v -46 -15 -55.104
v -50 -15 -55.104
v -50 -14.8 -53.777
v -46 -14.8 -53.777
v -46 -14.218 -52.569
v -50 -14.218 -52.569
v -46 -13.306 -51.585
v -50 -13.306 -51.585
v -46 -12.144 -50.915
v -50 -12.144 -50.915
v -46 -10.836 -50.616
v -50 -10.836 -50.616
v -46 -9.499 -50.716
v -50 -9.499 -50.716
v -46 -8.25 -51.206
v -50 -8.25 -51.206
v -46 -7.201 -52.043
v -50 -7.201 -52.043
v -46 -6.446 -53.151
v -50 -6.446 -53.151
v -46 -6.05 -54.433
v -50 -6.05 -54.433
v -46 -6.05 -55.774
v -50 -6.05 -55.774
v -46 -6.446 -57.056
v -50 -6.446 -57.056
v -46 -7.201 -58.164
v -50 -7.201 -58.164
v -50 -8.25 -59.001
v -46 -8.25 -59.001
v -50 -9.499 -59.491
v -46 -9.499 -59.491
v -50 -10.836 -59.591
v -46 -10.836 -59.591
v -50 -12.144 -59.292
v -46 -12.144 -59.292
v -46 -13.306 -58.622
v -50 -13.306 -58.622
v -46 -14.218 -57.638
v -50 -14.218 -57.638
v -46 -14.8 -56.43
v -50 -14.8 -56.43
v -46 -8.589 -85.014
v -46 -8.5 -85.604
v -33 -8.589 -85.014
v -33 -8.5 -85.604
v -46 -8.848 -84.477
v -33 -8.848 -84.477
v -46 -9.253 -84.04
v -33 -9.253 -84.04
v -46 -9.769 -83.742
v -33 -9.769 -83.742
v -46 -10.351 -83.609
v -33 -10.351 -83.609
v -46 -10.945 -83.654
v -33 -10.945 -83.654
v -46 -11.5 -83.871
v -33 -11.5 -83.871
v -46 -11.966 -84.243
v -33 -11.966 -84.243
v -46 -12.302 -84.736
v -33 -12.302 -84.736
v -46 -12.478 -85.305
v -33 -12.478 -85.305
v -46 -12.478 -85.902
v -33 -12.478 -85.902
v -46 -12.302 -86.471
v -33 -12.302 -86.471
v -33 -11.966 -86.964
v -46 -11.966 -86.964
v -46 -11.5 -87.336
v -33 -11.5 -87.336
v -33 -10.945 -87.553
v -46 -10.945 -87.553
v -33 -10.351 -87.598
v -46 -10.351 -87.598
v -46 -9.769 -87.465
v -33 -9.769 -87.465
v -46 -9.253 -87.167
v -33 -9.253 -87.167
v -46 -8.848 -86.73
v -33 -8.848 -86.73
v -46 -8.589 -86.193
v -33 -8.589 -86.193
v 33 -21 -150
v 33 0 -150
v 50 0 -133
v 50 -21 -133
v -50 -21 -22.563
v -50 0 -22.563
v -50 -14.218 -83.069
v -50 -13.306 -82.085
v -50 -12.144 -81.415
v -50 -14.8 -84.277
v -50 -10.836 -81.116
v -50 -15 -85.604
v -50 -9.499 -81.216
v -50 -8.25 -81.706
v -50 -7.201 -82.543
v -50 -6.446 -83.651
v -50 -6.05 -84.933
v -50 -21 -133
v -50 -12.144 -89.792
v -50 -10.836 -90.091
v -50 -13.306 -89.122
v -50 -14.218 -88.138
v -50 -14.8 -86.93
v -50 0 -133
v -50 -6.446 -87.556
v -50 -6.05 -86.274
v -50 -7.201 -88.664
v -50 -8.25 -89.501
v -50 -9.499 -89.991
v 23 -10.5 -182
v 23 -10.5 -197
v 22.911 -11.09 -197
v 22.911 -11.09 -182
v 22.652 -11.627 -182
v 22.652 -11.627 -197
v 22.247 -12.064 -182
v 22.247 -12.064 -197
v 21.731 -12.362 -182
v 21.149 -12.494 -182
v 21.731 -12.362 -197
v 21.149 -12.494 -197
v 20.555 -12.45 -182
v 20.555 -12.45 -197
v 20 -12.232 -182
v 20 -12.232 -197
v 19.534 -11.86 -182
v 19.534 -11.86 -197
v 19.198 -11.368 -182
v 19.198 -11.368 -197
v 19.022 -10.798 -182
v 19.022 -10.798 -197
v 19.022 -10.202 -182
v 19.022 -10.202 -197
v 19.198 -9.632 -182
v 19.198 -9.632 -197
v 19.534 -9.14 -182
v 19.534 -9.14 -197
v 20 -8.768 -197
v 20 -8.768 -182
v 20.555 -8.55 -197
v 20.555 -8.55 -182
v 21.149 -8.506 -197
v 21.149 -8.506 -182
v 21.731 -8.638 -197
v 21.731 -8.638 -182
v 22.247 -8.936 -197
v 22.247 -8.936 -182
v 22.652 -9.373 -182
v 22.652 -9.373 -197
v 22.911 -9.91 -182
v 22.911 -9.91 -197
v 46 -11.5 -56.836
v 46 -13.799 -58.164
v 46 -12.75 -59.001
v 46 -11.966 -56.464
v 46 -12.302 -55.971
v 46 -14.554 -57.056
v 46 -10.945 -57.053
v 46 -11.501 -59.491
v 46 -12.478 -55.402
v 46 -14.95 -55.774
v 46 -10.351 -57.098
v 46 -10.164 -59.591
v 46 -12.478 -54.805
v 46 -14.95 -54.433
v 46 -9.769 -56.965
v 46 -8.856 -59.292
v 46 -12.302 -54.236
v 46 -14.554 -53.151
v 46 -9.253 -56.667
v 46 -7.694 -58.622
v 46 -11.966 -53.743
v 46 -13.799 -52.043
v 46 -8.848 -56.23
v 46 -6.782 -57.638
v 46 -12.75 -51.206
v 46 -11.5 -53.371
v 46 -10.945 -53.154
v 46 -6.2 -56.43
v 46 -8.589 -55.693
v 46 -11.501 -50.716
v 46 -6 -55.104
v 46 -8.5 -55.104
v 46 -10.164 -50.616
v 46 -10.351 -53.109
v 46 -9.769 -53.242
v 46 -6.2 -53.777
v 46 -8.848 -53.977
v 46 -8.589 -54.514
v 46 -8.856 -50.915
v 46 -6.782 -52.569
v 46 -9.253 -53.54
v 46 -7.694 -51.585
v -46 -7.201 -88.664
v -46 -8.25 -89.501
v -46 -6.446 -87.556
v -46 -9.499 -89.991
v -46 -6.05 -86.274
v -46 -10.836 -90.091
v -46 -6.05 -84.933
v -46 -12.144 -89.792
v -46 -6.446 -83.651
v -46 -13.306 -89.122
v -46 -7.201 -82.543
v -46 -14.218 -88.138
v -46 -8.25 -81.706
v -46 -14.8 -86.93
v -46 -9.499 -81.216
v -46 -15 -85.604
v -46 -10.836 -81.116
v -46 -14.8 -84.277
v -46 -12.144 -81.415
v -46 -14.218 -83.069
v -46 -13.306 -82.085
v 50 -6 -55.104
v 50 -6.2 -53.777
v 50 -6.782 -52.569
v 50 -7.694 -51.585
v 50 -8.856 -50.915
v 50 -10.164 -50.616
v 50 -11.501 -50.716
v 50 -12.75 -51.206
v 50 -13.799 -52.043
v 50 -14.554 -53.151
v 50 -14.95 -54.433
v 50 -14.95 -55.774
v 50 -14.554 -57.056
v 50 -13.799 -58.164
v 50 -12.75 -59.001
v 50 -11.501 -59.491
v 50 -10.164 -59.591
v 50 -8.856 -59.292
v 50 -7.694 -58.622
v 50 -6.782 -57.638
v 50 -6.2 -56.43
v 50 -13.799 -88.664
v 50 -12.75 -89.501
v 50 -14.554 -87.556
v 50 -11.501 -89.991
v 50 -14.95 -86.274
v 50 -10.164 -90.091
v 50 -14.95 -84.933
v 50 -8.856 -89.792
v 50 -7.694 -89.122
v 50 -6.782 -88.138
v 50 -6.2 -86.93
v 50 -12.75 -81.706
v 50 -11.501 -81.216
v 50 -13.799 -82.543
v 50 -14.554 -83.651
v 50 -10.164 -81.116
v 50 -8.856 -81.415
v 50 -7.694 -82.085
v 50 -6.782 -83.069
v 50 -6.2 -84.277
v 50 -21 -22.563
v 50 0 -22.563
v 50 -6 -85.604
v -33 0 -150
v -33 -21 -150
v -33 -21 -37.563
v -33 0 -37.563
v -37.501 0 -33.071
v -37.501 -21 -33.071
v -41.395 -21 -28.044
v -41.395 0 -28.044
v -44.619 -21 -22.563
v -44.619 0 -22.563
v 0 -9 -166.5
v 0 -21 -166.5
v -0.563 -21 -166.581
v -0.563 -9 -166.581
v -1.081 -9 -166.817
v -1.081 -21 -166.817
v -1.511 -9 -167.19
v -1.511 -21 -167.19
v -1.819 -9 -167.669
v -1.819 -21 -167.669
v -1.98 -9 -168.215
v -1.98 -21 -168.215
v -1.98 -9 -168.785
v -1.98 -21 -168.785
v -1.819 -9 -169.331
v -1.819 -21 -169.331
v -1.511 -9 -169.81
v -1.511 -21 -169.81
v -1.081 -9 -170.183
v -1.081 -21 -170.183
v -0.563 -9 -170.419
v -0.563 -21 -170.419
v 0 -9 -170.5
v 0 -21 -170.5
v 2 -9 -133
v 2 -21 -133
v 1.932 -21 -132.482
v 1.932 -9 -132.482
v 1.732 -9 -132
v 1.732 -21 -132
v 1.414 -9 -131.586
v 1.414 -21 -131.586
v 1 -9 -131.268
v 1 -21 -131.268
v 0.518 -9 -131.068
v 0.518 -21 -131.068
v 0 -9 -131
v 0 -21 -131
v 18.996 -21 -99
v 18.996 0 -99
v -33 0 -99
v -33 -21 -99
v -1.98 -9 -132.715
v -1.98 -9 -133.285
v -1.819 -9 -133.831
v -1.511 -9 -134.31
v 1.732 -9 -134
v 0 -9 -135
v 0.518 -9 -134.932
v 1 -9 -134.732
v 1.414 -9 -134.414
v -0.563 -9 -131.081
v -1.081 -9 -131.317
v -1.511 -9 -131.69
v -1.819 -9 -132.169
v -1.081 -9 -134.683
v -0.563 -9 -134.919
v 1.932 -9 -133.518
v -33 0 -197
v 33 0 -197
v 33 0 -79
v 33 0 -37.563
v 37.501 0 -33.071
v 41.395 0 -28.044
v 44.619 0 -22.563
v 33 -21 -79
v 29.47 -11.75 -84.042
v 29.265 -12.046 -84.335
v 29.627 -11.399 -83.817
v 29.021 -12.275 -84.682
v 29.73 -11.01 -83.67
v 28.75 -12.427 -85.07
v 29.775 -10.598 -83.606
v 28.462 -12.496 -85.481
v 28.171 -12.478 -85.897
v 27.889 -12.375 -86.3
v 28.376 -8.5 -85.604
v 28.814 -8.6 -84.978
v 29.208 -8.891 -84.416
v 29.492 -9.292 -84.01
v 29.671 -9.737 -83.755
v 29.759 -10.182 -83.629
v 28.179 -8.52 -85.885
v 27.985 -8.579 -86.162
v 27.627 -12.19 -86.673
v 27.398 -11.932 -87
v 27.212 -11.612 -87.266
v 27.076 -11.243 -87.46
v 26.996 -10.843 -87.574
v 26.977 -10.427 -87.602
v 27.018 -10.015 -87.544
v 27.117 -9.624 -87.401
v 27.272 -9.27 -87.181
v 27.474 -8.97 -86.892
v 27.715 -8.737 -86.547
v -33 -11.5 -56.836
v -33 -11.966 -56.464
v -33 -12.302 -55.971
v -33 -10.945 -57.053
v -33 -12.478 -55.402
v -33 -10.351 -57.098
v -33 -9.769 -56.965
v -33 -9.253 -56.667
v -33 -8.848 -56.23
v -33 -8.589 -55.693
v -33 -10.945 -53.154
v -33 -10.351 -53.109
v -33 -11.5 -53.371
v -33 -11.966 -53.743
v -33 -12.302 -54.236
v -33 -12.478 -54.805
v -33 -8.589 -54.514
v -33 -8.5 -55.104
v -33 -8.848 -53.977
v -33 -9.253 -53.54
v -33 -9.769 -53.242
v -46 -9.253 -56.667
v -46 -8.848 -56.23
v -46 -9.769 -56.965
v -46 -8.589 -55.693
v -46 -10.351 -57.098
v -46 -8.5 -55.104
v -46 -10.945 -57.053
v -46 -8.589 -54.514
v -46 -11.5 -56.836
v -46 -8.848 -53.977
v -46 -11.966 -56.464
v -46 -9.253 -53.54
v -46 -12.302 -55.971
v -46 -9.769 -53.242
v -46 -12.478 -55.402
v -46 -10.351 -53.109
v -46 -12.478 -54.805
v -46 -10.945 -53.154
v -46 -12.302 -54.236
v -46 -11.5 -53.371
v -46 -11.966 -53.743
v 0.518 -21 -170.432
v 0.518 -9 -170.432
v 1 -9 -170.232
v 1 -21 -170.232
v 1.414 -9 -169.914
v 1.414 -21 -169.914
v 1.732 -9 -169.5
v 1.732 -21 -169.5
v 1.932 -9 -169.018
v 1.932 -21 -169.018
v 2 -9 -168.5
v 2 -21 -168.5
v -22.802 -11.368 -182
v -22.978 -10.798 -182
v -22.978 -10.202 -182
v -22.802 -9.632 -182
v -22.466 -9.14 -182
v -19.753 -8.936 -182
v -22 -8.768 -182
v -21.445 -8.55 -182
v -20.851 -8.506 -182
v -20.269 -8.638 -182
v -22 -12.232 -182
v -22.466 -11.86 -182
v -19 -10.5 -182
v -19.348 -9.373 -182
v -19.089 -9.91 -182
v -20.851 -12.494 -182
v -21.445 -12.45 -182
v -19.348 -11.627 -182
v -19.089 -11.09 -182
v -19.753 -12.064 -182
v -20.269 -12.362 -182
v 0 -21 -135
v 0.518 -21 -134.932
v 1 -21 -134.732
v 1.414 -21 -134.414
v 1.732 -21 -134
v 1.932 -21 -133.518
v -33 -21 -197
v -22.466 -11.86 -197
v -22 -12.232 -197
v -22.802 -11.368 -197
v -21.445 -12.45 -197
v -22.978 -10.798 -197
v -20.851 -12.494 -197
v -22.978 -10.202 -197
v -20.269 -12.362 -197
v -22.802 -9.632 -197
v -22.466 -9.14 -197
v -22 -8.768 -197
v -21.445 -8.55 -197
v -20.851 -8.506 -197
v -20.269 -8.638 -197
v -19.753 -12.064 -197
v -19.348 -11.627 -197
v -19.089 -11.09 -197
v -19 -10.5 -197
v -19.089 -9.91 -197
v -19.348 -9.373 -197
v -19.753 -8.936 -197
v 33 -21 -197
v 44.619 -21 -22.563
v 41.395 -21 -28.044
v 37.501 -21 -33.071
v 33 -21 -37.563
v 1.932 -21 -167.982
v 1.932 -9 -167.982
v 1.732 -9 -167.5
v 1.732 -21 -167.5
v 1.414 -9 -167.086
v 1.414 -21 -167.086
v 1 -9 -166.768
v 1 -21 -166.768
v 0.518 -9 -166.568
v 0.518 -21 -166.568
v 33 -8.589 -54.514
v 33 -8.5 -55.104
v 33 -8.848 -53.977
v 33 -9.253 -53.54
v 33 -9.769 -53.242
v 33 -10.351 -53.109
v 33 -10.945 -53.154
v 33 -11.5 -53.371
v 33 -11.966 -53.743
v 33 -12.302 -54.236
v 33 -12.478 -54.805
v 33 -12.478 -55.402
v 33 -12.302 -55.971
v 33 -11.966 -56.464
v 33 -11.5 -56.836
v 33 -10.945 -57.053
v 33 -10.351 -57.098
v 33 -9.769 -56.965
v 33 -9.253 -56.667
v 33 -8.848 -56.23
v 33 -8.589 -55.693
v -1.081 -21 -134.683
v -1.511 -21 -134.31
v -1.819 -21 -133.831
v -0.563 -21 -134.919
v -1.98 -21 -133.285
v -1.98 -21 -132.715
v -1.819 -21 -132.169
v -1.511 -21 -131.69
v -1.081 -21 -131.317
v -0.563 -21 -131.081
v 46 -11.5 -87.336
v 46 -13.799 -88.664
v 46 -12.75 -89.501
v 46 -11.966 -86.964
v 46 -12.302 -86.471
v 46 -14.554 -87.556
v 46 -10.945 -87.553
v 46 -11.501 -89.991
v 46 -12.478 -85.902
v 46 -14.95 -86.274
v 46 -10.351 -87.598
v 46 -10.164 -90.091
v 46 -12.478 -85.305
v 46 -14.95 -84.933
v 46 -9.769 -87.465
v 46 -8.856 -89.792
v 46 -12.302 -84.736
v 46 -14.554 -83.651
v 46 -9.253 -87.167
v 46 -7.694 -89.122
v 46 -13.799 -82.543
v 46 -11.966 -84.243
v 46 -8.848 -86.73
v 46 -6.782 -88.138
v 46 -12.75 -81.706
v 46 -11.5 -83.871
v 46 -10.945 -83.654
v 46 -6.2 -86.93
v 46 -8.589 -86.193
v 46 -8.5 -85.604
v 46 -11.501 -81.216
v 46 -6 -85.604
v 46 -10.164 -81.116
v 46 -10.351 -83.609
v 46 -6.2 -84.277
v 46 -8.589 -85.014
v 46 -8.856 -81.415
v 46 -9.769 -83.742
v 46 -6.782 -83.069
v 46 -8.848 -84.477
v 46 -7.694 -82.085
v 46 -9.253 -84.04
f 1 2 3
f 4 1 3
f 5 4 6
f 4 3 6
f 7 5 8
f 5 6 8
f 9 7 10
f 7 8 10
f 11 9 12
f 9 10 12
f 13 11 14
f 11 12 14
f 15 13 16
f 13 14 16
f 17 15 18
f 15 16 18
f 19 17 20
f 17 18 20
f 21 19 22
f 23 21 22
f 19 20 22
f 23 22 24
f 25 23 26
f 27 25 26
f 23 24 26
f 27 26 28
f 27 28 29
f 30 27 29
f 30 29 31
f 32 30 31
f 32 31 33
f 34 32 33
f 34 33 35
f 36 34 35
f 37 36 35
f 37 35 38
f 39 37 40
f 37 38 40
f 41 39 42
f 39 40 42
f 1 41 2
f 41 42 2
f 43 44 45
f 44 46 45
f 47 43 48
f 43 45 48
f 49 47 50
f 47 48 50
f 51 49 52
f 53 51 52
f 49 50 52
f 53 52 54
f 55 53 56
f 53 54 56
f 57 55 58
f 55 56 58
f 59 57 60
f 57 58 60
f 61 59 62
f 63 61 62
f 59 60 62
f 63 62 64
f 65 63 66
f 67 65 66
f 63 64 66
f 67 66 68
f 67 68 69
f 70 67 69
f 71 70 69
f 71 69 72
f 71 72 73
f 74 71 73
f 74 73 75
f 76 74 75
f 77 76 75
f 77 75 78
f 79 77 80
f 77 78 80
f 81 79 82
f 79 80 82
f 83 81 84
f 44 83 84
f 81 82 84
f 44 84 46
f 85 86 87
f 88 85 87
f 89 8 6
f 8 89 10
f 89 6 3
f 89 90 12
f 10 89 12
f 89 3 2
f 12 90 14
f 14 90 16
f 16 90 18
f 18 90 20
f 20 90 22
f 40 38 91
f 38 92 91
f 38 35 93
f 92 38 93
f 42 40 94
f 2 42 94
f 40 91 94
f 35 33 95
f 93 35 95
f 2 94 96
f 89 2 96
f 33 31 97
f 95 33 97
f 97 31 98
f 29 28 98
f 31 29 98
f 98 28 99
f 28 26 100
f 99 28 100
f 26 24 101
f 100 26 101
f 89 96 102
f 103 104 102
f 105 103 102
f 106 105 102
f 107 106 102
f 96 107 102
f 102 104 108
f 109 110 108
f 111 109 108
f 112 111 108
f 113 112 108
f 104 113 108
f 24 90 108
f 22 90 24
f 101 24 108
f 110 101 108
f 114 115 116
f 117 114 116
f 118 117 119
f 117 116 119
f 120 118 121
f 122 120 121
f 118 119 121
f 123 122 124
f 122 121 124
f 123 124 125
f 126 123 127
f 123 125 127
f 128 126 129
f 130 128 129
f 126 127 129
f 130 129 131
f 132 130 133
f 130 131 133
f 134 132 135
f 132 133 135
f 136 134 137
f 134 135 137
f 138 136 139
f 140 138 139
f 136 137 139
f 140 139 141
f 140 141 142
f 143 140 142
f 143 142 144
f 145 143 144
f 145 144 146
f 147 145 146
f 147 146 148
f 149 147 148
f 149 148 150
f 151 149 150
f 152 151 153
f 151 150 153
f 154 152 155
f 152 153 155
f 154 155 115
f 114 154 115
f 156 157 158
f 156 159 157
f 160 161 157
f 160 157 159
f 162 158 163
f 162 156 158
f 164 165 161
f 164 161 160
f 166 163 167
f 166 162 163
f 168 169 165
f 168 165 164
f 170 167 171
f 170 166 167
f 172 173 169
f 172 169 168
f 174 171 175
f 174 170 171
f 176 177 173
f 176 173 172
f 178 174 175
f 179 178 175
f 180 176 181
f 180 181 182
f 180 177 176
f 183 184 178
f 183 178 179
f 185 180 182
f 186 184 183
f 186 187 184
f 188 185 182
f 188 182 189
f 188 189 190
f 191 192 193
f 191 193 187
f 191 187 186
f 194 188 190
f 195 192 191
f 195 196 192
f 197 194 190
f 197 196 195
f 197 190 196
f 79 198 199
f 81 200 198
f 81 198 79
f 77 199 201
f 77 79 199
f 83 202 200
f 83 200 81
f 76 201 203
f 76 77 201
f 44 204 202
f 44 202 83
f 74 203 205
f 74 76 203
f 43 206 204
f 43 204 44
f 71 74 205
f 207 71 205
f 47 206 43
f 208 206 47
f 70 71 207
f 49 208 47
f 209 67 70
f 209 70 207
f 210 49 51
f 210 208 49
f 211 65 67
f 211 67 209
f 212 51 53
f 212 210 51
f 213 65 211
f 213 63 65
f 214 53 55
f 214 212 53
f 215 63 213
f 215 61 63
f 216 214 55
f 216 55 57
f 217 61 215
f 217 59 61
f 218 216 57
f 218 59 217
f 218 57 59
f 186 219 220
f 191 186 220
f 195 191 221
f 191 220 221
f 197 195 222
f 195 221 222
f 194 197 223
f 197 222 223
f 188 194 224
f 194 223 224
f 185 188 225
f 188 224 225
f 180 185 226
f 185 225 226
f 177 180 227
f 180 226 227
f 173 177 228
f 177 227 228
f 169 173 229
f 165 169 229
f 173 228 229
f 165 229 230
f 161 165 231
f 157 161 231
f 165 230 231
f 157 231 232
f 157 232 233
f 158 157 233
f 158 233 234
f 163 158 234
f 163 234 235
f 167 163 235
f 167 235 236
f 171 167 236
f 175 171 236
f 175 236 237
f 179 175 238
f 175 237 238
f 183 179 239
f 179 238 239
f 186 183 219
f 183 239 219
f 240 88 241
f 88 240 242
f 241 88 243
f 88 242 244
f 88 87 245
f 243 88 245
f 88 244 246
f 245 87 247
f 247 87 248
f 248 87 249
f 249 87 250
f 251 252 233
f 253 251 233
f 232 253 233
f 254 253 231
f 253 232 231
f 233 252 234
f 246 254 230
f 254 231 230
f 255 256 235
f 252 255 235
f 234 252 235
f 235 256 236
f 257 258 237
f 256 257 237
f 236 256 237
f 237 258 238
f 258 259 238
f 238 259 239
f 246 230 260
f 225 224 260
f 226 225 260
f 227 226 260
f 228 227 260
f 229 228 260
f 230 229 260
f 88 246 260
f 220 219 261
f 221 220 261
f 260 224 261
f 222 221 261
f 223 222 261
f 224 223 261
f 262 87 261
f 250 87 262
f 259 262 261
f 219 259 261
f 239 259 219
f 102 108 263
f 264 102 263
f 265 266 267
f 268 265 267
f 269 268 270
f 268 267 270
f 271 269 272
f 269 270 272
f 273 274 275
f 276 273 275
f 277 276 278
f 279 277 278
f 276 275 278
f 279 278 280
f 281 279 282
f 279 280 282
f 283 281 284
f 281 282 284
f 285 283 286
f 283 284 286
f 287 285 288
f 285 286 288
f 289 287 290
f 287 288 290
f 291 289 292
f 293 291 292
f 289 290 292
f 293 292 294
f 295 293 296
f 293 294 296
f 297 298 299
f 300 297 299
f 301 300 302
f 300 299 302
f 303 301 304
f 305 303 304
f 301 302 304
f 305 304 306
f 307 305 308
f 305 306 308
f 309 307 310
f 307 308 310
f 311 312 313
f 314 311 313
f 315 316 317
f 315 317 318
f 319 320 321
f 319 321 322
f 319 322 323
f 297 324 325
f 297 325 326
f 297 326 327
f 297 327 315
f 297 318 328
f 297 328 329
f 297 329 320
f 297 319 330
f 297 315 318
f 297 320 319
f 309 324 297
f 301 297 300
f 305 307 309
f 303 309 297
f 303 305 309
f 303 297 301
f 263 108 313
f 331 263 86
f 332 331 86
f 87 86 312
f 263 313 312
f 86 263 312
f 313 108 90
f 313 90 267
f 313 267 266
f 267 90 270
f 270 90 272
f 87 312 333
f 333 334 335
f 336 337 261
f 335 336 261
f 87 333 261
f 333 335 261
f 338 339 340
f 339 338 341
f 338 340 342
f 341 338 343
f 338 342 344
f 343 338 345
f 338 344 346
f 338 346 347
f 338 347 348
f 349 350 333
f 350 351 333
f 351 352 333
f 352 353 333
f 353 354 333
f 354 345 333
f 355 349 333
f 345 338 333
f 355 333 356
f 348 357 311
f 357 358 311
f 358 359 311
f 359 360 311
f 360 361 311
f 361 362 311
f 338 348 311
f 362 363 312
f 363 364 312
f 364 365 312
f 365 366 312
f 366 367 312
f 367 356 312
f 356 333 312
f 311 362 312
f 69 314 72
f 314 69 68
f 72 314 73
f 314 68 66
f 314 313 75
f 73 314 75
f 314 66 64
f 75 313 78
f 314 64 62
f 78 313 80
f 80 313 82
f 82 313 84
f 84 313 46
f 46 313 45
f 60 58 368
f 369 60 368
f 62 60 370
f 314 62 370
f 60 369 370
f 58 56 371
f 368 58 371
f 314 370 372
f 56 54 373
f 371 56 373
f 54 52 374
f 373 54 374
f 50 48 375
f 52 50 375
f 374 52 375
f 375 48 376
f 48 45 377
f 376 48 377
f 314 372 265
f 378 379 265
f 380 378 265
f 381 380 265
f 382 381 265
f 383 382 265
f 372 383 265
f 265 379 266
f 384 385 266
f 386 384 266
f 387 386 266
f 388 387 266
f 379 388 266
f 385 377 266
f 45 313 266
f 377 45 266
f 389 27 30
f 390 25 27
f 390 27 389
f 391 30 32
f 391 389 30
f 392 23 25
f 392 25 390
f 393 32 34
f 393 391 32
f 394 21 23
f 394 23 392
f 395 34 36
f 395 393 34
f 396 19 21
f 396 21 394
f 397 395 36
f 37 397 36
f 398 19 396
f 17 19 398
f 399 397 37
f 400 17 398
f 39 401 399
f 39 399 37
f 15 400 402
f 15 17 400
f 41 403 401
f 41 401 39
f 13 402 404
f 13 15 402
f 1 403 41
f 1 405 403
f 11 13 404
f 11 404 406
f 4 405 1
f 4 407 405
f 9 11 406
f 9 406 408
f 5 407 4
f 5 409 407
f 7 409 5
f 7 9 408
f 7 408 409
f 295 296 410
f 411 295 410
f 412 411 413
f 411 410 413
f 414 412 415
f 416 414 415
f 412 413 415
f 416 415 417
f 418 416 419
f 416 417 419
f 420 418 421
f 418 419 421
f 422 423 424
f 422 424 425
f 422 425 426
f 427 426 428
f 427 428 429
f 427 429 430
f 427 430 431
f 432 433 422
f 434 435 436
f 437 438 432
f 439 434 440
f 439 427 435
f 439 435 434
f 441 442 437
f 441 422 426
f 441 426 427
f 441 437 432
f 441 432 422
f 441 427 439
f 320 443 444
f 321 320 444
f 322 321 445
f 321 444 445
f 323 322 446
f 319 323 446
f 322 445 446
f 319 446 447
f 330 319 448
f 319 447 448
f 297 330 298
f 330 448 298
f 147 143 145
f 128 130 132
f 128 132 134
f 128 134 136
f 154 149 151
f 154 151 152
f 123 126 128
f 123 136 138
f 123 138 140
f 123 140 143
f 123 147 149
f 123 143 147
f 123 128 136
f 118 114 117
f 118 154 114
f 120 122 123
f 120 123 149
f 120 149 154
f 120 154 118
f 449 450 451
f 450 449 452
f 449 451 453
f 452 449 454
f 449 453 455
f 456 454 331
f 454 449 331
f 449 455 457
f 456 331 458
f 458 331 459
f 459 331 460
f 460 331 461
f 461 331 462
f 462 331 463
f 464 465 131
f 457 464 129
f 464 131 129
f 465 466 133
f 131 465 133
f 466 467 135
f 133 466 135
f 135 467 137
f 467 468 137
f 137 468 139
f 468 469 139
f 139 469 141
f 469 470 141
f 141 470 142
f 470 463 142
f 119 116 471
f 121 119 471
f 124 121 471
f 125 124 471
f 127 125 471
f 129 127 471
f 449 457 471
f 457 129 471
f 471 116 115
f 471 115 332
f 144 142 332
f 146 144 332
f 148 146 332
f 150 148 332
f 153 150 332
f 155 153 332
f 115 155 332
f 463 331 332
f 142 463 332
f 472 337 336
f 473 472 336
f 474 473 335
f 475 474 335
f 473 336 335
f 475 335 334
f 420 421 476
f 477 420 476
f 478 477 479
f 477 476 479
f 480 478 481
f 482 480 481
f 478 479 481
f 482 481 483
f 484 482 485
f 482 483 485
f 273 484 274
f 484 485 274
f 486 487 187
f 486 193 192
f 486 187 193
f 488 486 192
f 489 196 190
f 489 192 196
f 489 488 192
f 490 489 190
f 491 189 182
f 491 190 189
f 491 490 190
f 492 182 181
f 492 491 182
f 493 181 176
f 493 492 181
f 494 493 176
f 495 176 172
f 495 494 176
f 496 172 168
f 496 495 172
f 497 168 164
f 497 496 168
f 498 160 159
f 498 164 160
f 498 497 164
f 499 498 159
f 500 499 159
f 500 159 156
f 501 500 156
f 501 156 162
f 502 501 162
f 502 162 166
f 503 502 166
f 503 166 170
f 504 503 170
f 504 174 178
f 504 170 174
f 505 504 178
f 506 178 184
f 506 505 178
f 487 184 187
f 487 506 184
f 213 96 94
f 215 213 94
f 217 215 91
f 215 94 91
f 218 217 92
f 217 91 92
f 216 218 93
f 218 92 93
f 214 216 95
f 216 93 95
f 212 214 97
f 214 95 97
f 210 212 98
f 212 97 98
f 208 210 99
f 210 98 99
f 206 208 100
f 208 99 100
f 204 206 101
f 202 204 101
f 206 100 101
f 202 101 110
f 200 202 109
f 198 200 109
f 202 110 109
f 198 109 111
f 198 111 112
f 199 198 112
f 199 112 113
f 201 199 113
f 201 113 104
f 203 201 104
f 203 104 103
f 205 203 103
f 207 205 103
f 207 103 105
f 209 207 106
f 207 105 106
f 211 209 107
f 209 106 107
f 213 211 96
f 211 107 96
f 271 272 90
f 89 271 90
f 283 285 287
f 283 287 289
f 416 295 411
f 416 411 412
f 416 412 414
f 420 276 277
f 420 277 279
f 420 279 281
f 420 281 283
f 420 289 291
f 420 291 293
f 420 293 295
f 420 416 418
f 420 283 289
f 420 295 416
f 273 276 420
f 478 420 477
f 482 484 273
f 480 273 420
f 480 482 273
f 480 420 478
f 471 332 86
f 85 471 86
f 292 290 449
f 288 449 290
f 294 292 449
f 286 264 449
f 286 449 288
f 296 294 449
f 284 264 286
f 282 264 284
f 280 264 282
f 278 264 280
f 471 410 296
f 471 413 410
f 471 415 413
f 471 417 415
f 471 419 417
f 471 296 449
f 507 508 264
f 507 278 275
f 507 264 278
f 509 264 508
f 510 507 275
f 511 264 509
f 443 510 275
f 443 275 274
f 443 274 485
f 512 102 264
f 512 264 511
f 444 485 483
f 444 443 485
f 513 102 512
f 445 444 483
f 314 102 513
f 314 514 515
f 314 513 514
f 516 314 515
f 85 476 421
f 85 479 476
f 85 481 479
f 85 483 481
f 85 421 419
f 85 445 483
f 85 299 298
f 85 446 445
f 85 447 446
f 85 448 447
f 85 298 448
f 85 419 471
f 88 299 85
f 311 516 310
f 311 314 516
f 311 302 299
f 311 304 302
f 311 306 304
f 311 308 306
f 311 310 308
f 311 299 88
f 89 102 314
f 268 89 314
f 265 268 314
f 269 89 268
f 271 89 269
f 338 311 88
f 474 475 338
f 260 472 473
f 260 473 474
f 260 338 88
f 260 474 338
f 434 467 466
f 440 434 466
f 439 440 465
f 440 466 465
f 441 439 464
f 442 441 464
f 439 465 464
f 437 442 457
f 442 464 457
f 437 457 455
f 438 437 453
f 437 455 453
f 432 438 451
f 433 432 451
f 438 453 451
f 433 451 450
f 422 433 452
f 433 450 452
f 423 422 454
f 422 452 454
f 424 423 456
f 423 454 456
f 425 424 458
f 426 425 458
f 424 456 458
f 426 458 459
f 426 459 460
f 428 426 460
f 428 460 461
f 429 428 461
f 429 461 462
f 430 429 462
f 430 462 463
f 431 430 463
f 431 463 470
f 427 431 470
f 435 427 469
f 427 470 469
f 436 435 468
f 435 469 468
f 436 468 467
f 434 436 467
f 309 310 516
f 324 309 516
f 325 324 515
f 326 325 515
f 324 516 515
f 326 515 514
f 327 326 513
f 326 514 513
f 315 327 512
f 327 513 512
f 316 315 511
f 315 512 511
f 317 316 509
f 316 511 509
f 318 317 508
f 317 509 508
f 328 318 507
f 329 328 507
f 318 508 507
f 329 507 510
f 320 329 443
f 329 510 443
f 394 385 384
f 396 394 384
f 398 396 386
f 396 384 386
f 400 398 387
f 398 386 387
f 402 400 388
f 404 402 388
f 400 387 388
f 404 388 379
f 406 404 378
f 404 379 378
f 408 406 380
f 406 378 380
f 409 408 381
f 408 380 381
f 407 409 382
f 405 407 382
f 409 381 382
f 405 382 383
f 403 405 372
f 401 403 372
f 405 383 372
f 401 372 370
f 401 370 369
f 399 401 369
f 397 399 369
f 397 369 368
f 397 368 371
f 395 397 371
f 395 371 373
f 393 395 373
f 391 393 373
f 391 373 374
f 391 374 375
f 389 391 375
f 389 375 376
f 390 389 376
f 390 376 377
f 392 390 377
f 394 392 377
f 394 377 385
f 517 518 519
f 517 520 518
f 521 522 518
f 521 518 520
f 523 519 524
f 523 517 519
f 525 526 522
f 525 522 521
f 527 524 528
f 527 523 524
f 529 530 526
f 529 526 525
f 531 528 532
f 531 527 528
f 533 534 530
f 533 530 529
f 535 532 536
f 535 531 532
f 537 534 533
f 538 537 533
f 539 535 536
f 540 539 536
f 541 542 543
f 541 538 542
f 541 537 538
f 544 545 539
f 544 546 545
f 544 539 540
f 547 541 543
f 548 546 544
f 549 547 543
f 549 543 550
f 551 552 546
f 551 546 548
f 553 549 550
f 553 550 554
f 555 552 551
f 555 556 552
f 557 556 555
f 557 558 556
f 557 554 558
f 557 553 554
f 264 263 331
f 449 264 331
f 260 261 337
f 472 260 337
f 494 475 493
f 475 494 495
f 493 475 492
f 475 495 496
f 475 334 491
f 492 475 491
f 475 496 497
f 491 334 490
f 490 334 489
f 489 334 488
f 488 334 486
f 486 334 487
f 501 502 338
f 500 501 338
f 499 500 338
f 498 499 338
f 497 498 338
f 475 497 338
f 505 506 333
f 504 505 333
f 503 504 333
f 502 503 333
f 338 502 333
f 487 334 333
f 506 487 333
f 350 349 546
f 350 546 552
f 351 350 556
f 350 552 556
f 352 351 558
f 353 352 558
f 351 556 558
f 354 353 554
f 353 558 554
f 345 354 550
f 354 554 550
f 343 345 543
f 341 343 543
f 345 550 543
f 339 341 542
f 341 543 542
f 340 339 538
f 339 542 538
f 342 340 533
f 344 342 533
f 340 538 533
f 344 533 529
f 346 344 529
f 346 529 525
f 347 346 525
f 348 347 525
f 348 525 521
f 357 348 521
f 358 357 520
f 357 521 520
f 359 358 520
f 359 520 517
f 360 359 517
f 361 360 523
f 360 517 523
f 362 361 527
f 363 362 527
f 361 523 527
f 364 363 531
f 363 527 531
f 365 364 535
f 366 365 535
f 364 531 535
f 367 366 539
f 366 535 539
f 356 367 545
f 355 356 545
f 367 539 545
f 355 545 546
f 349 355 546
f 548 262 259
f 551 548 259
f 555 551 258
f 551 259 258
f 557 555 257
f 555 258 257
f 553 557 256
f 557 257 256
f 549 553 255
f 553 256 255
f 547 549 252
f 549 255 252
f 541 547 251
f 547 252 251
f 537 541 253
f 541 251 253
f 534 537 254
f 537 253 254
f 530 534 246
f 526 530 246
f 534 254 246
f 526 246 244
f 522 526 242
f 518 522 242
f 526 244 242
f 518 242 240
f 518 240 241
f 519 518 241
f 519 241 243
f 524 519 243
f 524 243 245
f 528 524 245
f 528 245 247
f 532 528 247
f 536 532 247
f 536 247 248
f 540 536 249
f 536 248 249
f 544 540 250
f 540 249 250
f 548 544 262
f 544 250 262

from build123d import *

# Parameters (mm, degrees)
F1_DEPTH  = 21
F2_R      = 2
F3_DEPTH  = 50
F4_R      = 4.5
F5_DEPTH  = 4
F6_R      = 4.5
F7_DEPTH  = 4
F8_R      = 2
F9_DEPTH  = 15
F11_DEPTH = 12


with BuildPart() as f1:
    # F0 (on Front) → F1 (new body)
    with BuildSketch(Plane.XZ):
        with BuildLine():
            ThreePointArc((44.619485, -22.56328), (39.527789, -30.619502), (33, -37.56328))
            Line((33, -37.56328), (33, -79))
            Line((33, -79), (18.995849, -99))
            Line((18.995849, -99), (0, -99))
            Line((0, -99), (-33, -99))
            Line((-33, -99), (-33, -37.56328))
            ThreePointArc((-33, -37.56328), (-39.527789, -30.619502), (-44.619485, -22.56328))
            Line((-44.619485, -22.56328), (-50, -22.56328))
            Line((-50, -22.56328), (-50, -133))
            Line((-50, -133), (-33, -150))
            Line((-33, -150), (-33, -180))
            Line((-33, -180), (-33, -197))
            Line((-33, -197), (0, -197))
            Line((0, -197), (33, -197))
            Line((33, -197), (33, -180))
            Line((33, -180), (33, -150))
            Line((33, -150), (50, -133))
            Line((50, -133), (50, -22.56328))
            Line((50, -22.56328), (44.619485, -22.56328))
        make_face()
    extrude(amount=F1_DEPTH)

    # F2 (on Right) → F3 (cut, symmetric)
    with BuildSketch(Plane.YZ):
        with Locations((-10.5, -55.10355)):
            Circle(F2_R)
        with Locations((-10.5, -85.60355)):
            Circle(F2_R)
    extrude(amount=F3_DEPTH, both=True, mode=Mode.SUBTRACT)

    # F4 (on face) → F5 (cut)
    with BuildSketch(Plane(origin=(-50, 0, 0), x_dir=(0, -1, 0), z_dir=(-1, 0, 0))):
        with Locations((10.5, -55.10355)):
            Circle(F4_R)
        with Locations((10.5, -85.60355)):
            Circle(F4_R)
    extrude(amount=-F5_DEPTH, mode=Mode.SUBTRACT)

    # F6 (on face) → F7 (cut)
    with BuildSketch(Plane.YZ.offset(50)):
        with Locations((-10.5, -55.10355)):
            Circle(F6_R)
        with Locations((-10.5, -85.60355)):
            Circle(F6_R)
    extrude(amount=-F7_DEPTH, mode=Mode.SUBTRACT)

    # F8 (on face) → F9 (cut)
    with BuildSketch(Plane(origin=(0, 0, -197), x_dir=(1, 0, 0), z_dir=(0, 0, -1))):
        with BuildLine():
            ThreePointArc((-23, 10.5), (-21, 8.5), (-19, 10.5))
            ThreePointArc((-19, 10.5), (-21, 12.5), (-23, 10.5))
        make_face()
        with Locations((21, 10.5)):
            Circle(F8_R)
    extrude(amount=-F9_DEPTH, mode=Mode.SUBTRACT)

    # F10 (on face) → F11 (cut)
    with BuildSketch(Plane.XZ.offset(21)):
        with BuildLine():
            ThreePointArc((0, -166.5), (-2, -168.5), (0, -170.5))
            Line((0, -170.5), (0, -166.5))
        make_face()
        with BuildLine():
            ThreePointArc((0, -131), (-2, -133), (0, -135))
            Line((0, -135), (0, -131))
        make_face()
        with BuildLine():
            Line((0, -131), (0, -135))
            ThreePointArc((0, -135), (1.414214, -134.414214), (2, -133))
            ThreePointArc((2, -133), (1.414214, -131.585786), (0, -131))
        make_face()
        with BuildLine():
            Line((0, -166.5), (0, -170.5))
            ThreePointArc((0, -170.5), (1.414214, -169.914214), (2, -168.5))
            ThreePointArc((2, -168.5), (1.414214, -167.085786), (0, -166.5))
        make_face()
    extrude(amount=-F11_DEPTH, mode=Mode.SUBTRACT)


solid = f1.part
